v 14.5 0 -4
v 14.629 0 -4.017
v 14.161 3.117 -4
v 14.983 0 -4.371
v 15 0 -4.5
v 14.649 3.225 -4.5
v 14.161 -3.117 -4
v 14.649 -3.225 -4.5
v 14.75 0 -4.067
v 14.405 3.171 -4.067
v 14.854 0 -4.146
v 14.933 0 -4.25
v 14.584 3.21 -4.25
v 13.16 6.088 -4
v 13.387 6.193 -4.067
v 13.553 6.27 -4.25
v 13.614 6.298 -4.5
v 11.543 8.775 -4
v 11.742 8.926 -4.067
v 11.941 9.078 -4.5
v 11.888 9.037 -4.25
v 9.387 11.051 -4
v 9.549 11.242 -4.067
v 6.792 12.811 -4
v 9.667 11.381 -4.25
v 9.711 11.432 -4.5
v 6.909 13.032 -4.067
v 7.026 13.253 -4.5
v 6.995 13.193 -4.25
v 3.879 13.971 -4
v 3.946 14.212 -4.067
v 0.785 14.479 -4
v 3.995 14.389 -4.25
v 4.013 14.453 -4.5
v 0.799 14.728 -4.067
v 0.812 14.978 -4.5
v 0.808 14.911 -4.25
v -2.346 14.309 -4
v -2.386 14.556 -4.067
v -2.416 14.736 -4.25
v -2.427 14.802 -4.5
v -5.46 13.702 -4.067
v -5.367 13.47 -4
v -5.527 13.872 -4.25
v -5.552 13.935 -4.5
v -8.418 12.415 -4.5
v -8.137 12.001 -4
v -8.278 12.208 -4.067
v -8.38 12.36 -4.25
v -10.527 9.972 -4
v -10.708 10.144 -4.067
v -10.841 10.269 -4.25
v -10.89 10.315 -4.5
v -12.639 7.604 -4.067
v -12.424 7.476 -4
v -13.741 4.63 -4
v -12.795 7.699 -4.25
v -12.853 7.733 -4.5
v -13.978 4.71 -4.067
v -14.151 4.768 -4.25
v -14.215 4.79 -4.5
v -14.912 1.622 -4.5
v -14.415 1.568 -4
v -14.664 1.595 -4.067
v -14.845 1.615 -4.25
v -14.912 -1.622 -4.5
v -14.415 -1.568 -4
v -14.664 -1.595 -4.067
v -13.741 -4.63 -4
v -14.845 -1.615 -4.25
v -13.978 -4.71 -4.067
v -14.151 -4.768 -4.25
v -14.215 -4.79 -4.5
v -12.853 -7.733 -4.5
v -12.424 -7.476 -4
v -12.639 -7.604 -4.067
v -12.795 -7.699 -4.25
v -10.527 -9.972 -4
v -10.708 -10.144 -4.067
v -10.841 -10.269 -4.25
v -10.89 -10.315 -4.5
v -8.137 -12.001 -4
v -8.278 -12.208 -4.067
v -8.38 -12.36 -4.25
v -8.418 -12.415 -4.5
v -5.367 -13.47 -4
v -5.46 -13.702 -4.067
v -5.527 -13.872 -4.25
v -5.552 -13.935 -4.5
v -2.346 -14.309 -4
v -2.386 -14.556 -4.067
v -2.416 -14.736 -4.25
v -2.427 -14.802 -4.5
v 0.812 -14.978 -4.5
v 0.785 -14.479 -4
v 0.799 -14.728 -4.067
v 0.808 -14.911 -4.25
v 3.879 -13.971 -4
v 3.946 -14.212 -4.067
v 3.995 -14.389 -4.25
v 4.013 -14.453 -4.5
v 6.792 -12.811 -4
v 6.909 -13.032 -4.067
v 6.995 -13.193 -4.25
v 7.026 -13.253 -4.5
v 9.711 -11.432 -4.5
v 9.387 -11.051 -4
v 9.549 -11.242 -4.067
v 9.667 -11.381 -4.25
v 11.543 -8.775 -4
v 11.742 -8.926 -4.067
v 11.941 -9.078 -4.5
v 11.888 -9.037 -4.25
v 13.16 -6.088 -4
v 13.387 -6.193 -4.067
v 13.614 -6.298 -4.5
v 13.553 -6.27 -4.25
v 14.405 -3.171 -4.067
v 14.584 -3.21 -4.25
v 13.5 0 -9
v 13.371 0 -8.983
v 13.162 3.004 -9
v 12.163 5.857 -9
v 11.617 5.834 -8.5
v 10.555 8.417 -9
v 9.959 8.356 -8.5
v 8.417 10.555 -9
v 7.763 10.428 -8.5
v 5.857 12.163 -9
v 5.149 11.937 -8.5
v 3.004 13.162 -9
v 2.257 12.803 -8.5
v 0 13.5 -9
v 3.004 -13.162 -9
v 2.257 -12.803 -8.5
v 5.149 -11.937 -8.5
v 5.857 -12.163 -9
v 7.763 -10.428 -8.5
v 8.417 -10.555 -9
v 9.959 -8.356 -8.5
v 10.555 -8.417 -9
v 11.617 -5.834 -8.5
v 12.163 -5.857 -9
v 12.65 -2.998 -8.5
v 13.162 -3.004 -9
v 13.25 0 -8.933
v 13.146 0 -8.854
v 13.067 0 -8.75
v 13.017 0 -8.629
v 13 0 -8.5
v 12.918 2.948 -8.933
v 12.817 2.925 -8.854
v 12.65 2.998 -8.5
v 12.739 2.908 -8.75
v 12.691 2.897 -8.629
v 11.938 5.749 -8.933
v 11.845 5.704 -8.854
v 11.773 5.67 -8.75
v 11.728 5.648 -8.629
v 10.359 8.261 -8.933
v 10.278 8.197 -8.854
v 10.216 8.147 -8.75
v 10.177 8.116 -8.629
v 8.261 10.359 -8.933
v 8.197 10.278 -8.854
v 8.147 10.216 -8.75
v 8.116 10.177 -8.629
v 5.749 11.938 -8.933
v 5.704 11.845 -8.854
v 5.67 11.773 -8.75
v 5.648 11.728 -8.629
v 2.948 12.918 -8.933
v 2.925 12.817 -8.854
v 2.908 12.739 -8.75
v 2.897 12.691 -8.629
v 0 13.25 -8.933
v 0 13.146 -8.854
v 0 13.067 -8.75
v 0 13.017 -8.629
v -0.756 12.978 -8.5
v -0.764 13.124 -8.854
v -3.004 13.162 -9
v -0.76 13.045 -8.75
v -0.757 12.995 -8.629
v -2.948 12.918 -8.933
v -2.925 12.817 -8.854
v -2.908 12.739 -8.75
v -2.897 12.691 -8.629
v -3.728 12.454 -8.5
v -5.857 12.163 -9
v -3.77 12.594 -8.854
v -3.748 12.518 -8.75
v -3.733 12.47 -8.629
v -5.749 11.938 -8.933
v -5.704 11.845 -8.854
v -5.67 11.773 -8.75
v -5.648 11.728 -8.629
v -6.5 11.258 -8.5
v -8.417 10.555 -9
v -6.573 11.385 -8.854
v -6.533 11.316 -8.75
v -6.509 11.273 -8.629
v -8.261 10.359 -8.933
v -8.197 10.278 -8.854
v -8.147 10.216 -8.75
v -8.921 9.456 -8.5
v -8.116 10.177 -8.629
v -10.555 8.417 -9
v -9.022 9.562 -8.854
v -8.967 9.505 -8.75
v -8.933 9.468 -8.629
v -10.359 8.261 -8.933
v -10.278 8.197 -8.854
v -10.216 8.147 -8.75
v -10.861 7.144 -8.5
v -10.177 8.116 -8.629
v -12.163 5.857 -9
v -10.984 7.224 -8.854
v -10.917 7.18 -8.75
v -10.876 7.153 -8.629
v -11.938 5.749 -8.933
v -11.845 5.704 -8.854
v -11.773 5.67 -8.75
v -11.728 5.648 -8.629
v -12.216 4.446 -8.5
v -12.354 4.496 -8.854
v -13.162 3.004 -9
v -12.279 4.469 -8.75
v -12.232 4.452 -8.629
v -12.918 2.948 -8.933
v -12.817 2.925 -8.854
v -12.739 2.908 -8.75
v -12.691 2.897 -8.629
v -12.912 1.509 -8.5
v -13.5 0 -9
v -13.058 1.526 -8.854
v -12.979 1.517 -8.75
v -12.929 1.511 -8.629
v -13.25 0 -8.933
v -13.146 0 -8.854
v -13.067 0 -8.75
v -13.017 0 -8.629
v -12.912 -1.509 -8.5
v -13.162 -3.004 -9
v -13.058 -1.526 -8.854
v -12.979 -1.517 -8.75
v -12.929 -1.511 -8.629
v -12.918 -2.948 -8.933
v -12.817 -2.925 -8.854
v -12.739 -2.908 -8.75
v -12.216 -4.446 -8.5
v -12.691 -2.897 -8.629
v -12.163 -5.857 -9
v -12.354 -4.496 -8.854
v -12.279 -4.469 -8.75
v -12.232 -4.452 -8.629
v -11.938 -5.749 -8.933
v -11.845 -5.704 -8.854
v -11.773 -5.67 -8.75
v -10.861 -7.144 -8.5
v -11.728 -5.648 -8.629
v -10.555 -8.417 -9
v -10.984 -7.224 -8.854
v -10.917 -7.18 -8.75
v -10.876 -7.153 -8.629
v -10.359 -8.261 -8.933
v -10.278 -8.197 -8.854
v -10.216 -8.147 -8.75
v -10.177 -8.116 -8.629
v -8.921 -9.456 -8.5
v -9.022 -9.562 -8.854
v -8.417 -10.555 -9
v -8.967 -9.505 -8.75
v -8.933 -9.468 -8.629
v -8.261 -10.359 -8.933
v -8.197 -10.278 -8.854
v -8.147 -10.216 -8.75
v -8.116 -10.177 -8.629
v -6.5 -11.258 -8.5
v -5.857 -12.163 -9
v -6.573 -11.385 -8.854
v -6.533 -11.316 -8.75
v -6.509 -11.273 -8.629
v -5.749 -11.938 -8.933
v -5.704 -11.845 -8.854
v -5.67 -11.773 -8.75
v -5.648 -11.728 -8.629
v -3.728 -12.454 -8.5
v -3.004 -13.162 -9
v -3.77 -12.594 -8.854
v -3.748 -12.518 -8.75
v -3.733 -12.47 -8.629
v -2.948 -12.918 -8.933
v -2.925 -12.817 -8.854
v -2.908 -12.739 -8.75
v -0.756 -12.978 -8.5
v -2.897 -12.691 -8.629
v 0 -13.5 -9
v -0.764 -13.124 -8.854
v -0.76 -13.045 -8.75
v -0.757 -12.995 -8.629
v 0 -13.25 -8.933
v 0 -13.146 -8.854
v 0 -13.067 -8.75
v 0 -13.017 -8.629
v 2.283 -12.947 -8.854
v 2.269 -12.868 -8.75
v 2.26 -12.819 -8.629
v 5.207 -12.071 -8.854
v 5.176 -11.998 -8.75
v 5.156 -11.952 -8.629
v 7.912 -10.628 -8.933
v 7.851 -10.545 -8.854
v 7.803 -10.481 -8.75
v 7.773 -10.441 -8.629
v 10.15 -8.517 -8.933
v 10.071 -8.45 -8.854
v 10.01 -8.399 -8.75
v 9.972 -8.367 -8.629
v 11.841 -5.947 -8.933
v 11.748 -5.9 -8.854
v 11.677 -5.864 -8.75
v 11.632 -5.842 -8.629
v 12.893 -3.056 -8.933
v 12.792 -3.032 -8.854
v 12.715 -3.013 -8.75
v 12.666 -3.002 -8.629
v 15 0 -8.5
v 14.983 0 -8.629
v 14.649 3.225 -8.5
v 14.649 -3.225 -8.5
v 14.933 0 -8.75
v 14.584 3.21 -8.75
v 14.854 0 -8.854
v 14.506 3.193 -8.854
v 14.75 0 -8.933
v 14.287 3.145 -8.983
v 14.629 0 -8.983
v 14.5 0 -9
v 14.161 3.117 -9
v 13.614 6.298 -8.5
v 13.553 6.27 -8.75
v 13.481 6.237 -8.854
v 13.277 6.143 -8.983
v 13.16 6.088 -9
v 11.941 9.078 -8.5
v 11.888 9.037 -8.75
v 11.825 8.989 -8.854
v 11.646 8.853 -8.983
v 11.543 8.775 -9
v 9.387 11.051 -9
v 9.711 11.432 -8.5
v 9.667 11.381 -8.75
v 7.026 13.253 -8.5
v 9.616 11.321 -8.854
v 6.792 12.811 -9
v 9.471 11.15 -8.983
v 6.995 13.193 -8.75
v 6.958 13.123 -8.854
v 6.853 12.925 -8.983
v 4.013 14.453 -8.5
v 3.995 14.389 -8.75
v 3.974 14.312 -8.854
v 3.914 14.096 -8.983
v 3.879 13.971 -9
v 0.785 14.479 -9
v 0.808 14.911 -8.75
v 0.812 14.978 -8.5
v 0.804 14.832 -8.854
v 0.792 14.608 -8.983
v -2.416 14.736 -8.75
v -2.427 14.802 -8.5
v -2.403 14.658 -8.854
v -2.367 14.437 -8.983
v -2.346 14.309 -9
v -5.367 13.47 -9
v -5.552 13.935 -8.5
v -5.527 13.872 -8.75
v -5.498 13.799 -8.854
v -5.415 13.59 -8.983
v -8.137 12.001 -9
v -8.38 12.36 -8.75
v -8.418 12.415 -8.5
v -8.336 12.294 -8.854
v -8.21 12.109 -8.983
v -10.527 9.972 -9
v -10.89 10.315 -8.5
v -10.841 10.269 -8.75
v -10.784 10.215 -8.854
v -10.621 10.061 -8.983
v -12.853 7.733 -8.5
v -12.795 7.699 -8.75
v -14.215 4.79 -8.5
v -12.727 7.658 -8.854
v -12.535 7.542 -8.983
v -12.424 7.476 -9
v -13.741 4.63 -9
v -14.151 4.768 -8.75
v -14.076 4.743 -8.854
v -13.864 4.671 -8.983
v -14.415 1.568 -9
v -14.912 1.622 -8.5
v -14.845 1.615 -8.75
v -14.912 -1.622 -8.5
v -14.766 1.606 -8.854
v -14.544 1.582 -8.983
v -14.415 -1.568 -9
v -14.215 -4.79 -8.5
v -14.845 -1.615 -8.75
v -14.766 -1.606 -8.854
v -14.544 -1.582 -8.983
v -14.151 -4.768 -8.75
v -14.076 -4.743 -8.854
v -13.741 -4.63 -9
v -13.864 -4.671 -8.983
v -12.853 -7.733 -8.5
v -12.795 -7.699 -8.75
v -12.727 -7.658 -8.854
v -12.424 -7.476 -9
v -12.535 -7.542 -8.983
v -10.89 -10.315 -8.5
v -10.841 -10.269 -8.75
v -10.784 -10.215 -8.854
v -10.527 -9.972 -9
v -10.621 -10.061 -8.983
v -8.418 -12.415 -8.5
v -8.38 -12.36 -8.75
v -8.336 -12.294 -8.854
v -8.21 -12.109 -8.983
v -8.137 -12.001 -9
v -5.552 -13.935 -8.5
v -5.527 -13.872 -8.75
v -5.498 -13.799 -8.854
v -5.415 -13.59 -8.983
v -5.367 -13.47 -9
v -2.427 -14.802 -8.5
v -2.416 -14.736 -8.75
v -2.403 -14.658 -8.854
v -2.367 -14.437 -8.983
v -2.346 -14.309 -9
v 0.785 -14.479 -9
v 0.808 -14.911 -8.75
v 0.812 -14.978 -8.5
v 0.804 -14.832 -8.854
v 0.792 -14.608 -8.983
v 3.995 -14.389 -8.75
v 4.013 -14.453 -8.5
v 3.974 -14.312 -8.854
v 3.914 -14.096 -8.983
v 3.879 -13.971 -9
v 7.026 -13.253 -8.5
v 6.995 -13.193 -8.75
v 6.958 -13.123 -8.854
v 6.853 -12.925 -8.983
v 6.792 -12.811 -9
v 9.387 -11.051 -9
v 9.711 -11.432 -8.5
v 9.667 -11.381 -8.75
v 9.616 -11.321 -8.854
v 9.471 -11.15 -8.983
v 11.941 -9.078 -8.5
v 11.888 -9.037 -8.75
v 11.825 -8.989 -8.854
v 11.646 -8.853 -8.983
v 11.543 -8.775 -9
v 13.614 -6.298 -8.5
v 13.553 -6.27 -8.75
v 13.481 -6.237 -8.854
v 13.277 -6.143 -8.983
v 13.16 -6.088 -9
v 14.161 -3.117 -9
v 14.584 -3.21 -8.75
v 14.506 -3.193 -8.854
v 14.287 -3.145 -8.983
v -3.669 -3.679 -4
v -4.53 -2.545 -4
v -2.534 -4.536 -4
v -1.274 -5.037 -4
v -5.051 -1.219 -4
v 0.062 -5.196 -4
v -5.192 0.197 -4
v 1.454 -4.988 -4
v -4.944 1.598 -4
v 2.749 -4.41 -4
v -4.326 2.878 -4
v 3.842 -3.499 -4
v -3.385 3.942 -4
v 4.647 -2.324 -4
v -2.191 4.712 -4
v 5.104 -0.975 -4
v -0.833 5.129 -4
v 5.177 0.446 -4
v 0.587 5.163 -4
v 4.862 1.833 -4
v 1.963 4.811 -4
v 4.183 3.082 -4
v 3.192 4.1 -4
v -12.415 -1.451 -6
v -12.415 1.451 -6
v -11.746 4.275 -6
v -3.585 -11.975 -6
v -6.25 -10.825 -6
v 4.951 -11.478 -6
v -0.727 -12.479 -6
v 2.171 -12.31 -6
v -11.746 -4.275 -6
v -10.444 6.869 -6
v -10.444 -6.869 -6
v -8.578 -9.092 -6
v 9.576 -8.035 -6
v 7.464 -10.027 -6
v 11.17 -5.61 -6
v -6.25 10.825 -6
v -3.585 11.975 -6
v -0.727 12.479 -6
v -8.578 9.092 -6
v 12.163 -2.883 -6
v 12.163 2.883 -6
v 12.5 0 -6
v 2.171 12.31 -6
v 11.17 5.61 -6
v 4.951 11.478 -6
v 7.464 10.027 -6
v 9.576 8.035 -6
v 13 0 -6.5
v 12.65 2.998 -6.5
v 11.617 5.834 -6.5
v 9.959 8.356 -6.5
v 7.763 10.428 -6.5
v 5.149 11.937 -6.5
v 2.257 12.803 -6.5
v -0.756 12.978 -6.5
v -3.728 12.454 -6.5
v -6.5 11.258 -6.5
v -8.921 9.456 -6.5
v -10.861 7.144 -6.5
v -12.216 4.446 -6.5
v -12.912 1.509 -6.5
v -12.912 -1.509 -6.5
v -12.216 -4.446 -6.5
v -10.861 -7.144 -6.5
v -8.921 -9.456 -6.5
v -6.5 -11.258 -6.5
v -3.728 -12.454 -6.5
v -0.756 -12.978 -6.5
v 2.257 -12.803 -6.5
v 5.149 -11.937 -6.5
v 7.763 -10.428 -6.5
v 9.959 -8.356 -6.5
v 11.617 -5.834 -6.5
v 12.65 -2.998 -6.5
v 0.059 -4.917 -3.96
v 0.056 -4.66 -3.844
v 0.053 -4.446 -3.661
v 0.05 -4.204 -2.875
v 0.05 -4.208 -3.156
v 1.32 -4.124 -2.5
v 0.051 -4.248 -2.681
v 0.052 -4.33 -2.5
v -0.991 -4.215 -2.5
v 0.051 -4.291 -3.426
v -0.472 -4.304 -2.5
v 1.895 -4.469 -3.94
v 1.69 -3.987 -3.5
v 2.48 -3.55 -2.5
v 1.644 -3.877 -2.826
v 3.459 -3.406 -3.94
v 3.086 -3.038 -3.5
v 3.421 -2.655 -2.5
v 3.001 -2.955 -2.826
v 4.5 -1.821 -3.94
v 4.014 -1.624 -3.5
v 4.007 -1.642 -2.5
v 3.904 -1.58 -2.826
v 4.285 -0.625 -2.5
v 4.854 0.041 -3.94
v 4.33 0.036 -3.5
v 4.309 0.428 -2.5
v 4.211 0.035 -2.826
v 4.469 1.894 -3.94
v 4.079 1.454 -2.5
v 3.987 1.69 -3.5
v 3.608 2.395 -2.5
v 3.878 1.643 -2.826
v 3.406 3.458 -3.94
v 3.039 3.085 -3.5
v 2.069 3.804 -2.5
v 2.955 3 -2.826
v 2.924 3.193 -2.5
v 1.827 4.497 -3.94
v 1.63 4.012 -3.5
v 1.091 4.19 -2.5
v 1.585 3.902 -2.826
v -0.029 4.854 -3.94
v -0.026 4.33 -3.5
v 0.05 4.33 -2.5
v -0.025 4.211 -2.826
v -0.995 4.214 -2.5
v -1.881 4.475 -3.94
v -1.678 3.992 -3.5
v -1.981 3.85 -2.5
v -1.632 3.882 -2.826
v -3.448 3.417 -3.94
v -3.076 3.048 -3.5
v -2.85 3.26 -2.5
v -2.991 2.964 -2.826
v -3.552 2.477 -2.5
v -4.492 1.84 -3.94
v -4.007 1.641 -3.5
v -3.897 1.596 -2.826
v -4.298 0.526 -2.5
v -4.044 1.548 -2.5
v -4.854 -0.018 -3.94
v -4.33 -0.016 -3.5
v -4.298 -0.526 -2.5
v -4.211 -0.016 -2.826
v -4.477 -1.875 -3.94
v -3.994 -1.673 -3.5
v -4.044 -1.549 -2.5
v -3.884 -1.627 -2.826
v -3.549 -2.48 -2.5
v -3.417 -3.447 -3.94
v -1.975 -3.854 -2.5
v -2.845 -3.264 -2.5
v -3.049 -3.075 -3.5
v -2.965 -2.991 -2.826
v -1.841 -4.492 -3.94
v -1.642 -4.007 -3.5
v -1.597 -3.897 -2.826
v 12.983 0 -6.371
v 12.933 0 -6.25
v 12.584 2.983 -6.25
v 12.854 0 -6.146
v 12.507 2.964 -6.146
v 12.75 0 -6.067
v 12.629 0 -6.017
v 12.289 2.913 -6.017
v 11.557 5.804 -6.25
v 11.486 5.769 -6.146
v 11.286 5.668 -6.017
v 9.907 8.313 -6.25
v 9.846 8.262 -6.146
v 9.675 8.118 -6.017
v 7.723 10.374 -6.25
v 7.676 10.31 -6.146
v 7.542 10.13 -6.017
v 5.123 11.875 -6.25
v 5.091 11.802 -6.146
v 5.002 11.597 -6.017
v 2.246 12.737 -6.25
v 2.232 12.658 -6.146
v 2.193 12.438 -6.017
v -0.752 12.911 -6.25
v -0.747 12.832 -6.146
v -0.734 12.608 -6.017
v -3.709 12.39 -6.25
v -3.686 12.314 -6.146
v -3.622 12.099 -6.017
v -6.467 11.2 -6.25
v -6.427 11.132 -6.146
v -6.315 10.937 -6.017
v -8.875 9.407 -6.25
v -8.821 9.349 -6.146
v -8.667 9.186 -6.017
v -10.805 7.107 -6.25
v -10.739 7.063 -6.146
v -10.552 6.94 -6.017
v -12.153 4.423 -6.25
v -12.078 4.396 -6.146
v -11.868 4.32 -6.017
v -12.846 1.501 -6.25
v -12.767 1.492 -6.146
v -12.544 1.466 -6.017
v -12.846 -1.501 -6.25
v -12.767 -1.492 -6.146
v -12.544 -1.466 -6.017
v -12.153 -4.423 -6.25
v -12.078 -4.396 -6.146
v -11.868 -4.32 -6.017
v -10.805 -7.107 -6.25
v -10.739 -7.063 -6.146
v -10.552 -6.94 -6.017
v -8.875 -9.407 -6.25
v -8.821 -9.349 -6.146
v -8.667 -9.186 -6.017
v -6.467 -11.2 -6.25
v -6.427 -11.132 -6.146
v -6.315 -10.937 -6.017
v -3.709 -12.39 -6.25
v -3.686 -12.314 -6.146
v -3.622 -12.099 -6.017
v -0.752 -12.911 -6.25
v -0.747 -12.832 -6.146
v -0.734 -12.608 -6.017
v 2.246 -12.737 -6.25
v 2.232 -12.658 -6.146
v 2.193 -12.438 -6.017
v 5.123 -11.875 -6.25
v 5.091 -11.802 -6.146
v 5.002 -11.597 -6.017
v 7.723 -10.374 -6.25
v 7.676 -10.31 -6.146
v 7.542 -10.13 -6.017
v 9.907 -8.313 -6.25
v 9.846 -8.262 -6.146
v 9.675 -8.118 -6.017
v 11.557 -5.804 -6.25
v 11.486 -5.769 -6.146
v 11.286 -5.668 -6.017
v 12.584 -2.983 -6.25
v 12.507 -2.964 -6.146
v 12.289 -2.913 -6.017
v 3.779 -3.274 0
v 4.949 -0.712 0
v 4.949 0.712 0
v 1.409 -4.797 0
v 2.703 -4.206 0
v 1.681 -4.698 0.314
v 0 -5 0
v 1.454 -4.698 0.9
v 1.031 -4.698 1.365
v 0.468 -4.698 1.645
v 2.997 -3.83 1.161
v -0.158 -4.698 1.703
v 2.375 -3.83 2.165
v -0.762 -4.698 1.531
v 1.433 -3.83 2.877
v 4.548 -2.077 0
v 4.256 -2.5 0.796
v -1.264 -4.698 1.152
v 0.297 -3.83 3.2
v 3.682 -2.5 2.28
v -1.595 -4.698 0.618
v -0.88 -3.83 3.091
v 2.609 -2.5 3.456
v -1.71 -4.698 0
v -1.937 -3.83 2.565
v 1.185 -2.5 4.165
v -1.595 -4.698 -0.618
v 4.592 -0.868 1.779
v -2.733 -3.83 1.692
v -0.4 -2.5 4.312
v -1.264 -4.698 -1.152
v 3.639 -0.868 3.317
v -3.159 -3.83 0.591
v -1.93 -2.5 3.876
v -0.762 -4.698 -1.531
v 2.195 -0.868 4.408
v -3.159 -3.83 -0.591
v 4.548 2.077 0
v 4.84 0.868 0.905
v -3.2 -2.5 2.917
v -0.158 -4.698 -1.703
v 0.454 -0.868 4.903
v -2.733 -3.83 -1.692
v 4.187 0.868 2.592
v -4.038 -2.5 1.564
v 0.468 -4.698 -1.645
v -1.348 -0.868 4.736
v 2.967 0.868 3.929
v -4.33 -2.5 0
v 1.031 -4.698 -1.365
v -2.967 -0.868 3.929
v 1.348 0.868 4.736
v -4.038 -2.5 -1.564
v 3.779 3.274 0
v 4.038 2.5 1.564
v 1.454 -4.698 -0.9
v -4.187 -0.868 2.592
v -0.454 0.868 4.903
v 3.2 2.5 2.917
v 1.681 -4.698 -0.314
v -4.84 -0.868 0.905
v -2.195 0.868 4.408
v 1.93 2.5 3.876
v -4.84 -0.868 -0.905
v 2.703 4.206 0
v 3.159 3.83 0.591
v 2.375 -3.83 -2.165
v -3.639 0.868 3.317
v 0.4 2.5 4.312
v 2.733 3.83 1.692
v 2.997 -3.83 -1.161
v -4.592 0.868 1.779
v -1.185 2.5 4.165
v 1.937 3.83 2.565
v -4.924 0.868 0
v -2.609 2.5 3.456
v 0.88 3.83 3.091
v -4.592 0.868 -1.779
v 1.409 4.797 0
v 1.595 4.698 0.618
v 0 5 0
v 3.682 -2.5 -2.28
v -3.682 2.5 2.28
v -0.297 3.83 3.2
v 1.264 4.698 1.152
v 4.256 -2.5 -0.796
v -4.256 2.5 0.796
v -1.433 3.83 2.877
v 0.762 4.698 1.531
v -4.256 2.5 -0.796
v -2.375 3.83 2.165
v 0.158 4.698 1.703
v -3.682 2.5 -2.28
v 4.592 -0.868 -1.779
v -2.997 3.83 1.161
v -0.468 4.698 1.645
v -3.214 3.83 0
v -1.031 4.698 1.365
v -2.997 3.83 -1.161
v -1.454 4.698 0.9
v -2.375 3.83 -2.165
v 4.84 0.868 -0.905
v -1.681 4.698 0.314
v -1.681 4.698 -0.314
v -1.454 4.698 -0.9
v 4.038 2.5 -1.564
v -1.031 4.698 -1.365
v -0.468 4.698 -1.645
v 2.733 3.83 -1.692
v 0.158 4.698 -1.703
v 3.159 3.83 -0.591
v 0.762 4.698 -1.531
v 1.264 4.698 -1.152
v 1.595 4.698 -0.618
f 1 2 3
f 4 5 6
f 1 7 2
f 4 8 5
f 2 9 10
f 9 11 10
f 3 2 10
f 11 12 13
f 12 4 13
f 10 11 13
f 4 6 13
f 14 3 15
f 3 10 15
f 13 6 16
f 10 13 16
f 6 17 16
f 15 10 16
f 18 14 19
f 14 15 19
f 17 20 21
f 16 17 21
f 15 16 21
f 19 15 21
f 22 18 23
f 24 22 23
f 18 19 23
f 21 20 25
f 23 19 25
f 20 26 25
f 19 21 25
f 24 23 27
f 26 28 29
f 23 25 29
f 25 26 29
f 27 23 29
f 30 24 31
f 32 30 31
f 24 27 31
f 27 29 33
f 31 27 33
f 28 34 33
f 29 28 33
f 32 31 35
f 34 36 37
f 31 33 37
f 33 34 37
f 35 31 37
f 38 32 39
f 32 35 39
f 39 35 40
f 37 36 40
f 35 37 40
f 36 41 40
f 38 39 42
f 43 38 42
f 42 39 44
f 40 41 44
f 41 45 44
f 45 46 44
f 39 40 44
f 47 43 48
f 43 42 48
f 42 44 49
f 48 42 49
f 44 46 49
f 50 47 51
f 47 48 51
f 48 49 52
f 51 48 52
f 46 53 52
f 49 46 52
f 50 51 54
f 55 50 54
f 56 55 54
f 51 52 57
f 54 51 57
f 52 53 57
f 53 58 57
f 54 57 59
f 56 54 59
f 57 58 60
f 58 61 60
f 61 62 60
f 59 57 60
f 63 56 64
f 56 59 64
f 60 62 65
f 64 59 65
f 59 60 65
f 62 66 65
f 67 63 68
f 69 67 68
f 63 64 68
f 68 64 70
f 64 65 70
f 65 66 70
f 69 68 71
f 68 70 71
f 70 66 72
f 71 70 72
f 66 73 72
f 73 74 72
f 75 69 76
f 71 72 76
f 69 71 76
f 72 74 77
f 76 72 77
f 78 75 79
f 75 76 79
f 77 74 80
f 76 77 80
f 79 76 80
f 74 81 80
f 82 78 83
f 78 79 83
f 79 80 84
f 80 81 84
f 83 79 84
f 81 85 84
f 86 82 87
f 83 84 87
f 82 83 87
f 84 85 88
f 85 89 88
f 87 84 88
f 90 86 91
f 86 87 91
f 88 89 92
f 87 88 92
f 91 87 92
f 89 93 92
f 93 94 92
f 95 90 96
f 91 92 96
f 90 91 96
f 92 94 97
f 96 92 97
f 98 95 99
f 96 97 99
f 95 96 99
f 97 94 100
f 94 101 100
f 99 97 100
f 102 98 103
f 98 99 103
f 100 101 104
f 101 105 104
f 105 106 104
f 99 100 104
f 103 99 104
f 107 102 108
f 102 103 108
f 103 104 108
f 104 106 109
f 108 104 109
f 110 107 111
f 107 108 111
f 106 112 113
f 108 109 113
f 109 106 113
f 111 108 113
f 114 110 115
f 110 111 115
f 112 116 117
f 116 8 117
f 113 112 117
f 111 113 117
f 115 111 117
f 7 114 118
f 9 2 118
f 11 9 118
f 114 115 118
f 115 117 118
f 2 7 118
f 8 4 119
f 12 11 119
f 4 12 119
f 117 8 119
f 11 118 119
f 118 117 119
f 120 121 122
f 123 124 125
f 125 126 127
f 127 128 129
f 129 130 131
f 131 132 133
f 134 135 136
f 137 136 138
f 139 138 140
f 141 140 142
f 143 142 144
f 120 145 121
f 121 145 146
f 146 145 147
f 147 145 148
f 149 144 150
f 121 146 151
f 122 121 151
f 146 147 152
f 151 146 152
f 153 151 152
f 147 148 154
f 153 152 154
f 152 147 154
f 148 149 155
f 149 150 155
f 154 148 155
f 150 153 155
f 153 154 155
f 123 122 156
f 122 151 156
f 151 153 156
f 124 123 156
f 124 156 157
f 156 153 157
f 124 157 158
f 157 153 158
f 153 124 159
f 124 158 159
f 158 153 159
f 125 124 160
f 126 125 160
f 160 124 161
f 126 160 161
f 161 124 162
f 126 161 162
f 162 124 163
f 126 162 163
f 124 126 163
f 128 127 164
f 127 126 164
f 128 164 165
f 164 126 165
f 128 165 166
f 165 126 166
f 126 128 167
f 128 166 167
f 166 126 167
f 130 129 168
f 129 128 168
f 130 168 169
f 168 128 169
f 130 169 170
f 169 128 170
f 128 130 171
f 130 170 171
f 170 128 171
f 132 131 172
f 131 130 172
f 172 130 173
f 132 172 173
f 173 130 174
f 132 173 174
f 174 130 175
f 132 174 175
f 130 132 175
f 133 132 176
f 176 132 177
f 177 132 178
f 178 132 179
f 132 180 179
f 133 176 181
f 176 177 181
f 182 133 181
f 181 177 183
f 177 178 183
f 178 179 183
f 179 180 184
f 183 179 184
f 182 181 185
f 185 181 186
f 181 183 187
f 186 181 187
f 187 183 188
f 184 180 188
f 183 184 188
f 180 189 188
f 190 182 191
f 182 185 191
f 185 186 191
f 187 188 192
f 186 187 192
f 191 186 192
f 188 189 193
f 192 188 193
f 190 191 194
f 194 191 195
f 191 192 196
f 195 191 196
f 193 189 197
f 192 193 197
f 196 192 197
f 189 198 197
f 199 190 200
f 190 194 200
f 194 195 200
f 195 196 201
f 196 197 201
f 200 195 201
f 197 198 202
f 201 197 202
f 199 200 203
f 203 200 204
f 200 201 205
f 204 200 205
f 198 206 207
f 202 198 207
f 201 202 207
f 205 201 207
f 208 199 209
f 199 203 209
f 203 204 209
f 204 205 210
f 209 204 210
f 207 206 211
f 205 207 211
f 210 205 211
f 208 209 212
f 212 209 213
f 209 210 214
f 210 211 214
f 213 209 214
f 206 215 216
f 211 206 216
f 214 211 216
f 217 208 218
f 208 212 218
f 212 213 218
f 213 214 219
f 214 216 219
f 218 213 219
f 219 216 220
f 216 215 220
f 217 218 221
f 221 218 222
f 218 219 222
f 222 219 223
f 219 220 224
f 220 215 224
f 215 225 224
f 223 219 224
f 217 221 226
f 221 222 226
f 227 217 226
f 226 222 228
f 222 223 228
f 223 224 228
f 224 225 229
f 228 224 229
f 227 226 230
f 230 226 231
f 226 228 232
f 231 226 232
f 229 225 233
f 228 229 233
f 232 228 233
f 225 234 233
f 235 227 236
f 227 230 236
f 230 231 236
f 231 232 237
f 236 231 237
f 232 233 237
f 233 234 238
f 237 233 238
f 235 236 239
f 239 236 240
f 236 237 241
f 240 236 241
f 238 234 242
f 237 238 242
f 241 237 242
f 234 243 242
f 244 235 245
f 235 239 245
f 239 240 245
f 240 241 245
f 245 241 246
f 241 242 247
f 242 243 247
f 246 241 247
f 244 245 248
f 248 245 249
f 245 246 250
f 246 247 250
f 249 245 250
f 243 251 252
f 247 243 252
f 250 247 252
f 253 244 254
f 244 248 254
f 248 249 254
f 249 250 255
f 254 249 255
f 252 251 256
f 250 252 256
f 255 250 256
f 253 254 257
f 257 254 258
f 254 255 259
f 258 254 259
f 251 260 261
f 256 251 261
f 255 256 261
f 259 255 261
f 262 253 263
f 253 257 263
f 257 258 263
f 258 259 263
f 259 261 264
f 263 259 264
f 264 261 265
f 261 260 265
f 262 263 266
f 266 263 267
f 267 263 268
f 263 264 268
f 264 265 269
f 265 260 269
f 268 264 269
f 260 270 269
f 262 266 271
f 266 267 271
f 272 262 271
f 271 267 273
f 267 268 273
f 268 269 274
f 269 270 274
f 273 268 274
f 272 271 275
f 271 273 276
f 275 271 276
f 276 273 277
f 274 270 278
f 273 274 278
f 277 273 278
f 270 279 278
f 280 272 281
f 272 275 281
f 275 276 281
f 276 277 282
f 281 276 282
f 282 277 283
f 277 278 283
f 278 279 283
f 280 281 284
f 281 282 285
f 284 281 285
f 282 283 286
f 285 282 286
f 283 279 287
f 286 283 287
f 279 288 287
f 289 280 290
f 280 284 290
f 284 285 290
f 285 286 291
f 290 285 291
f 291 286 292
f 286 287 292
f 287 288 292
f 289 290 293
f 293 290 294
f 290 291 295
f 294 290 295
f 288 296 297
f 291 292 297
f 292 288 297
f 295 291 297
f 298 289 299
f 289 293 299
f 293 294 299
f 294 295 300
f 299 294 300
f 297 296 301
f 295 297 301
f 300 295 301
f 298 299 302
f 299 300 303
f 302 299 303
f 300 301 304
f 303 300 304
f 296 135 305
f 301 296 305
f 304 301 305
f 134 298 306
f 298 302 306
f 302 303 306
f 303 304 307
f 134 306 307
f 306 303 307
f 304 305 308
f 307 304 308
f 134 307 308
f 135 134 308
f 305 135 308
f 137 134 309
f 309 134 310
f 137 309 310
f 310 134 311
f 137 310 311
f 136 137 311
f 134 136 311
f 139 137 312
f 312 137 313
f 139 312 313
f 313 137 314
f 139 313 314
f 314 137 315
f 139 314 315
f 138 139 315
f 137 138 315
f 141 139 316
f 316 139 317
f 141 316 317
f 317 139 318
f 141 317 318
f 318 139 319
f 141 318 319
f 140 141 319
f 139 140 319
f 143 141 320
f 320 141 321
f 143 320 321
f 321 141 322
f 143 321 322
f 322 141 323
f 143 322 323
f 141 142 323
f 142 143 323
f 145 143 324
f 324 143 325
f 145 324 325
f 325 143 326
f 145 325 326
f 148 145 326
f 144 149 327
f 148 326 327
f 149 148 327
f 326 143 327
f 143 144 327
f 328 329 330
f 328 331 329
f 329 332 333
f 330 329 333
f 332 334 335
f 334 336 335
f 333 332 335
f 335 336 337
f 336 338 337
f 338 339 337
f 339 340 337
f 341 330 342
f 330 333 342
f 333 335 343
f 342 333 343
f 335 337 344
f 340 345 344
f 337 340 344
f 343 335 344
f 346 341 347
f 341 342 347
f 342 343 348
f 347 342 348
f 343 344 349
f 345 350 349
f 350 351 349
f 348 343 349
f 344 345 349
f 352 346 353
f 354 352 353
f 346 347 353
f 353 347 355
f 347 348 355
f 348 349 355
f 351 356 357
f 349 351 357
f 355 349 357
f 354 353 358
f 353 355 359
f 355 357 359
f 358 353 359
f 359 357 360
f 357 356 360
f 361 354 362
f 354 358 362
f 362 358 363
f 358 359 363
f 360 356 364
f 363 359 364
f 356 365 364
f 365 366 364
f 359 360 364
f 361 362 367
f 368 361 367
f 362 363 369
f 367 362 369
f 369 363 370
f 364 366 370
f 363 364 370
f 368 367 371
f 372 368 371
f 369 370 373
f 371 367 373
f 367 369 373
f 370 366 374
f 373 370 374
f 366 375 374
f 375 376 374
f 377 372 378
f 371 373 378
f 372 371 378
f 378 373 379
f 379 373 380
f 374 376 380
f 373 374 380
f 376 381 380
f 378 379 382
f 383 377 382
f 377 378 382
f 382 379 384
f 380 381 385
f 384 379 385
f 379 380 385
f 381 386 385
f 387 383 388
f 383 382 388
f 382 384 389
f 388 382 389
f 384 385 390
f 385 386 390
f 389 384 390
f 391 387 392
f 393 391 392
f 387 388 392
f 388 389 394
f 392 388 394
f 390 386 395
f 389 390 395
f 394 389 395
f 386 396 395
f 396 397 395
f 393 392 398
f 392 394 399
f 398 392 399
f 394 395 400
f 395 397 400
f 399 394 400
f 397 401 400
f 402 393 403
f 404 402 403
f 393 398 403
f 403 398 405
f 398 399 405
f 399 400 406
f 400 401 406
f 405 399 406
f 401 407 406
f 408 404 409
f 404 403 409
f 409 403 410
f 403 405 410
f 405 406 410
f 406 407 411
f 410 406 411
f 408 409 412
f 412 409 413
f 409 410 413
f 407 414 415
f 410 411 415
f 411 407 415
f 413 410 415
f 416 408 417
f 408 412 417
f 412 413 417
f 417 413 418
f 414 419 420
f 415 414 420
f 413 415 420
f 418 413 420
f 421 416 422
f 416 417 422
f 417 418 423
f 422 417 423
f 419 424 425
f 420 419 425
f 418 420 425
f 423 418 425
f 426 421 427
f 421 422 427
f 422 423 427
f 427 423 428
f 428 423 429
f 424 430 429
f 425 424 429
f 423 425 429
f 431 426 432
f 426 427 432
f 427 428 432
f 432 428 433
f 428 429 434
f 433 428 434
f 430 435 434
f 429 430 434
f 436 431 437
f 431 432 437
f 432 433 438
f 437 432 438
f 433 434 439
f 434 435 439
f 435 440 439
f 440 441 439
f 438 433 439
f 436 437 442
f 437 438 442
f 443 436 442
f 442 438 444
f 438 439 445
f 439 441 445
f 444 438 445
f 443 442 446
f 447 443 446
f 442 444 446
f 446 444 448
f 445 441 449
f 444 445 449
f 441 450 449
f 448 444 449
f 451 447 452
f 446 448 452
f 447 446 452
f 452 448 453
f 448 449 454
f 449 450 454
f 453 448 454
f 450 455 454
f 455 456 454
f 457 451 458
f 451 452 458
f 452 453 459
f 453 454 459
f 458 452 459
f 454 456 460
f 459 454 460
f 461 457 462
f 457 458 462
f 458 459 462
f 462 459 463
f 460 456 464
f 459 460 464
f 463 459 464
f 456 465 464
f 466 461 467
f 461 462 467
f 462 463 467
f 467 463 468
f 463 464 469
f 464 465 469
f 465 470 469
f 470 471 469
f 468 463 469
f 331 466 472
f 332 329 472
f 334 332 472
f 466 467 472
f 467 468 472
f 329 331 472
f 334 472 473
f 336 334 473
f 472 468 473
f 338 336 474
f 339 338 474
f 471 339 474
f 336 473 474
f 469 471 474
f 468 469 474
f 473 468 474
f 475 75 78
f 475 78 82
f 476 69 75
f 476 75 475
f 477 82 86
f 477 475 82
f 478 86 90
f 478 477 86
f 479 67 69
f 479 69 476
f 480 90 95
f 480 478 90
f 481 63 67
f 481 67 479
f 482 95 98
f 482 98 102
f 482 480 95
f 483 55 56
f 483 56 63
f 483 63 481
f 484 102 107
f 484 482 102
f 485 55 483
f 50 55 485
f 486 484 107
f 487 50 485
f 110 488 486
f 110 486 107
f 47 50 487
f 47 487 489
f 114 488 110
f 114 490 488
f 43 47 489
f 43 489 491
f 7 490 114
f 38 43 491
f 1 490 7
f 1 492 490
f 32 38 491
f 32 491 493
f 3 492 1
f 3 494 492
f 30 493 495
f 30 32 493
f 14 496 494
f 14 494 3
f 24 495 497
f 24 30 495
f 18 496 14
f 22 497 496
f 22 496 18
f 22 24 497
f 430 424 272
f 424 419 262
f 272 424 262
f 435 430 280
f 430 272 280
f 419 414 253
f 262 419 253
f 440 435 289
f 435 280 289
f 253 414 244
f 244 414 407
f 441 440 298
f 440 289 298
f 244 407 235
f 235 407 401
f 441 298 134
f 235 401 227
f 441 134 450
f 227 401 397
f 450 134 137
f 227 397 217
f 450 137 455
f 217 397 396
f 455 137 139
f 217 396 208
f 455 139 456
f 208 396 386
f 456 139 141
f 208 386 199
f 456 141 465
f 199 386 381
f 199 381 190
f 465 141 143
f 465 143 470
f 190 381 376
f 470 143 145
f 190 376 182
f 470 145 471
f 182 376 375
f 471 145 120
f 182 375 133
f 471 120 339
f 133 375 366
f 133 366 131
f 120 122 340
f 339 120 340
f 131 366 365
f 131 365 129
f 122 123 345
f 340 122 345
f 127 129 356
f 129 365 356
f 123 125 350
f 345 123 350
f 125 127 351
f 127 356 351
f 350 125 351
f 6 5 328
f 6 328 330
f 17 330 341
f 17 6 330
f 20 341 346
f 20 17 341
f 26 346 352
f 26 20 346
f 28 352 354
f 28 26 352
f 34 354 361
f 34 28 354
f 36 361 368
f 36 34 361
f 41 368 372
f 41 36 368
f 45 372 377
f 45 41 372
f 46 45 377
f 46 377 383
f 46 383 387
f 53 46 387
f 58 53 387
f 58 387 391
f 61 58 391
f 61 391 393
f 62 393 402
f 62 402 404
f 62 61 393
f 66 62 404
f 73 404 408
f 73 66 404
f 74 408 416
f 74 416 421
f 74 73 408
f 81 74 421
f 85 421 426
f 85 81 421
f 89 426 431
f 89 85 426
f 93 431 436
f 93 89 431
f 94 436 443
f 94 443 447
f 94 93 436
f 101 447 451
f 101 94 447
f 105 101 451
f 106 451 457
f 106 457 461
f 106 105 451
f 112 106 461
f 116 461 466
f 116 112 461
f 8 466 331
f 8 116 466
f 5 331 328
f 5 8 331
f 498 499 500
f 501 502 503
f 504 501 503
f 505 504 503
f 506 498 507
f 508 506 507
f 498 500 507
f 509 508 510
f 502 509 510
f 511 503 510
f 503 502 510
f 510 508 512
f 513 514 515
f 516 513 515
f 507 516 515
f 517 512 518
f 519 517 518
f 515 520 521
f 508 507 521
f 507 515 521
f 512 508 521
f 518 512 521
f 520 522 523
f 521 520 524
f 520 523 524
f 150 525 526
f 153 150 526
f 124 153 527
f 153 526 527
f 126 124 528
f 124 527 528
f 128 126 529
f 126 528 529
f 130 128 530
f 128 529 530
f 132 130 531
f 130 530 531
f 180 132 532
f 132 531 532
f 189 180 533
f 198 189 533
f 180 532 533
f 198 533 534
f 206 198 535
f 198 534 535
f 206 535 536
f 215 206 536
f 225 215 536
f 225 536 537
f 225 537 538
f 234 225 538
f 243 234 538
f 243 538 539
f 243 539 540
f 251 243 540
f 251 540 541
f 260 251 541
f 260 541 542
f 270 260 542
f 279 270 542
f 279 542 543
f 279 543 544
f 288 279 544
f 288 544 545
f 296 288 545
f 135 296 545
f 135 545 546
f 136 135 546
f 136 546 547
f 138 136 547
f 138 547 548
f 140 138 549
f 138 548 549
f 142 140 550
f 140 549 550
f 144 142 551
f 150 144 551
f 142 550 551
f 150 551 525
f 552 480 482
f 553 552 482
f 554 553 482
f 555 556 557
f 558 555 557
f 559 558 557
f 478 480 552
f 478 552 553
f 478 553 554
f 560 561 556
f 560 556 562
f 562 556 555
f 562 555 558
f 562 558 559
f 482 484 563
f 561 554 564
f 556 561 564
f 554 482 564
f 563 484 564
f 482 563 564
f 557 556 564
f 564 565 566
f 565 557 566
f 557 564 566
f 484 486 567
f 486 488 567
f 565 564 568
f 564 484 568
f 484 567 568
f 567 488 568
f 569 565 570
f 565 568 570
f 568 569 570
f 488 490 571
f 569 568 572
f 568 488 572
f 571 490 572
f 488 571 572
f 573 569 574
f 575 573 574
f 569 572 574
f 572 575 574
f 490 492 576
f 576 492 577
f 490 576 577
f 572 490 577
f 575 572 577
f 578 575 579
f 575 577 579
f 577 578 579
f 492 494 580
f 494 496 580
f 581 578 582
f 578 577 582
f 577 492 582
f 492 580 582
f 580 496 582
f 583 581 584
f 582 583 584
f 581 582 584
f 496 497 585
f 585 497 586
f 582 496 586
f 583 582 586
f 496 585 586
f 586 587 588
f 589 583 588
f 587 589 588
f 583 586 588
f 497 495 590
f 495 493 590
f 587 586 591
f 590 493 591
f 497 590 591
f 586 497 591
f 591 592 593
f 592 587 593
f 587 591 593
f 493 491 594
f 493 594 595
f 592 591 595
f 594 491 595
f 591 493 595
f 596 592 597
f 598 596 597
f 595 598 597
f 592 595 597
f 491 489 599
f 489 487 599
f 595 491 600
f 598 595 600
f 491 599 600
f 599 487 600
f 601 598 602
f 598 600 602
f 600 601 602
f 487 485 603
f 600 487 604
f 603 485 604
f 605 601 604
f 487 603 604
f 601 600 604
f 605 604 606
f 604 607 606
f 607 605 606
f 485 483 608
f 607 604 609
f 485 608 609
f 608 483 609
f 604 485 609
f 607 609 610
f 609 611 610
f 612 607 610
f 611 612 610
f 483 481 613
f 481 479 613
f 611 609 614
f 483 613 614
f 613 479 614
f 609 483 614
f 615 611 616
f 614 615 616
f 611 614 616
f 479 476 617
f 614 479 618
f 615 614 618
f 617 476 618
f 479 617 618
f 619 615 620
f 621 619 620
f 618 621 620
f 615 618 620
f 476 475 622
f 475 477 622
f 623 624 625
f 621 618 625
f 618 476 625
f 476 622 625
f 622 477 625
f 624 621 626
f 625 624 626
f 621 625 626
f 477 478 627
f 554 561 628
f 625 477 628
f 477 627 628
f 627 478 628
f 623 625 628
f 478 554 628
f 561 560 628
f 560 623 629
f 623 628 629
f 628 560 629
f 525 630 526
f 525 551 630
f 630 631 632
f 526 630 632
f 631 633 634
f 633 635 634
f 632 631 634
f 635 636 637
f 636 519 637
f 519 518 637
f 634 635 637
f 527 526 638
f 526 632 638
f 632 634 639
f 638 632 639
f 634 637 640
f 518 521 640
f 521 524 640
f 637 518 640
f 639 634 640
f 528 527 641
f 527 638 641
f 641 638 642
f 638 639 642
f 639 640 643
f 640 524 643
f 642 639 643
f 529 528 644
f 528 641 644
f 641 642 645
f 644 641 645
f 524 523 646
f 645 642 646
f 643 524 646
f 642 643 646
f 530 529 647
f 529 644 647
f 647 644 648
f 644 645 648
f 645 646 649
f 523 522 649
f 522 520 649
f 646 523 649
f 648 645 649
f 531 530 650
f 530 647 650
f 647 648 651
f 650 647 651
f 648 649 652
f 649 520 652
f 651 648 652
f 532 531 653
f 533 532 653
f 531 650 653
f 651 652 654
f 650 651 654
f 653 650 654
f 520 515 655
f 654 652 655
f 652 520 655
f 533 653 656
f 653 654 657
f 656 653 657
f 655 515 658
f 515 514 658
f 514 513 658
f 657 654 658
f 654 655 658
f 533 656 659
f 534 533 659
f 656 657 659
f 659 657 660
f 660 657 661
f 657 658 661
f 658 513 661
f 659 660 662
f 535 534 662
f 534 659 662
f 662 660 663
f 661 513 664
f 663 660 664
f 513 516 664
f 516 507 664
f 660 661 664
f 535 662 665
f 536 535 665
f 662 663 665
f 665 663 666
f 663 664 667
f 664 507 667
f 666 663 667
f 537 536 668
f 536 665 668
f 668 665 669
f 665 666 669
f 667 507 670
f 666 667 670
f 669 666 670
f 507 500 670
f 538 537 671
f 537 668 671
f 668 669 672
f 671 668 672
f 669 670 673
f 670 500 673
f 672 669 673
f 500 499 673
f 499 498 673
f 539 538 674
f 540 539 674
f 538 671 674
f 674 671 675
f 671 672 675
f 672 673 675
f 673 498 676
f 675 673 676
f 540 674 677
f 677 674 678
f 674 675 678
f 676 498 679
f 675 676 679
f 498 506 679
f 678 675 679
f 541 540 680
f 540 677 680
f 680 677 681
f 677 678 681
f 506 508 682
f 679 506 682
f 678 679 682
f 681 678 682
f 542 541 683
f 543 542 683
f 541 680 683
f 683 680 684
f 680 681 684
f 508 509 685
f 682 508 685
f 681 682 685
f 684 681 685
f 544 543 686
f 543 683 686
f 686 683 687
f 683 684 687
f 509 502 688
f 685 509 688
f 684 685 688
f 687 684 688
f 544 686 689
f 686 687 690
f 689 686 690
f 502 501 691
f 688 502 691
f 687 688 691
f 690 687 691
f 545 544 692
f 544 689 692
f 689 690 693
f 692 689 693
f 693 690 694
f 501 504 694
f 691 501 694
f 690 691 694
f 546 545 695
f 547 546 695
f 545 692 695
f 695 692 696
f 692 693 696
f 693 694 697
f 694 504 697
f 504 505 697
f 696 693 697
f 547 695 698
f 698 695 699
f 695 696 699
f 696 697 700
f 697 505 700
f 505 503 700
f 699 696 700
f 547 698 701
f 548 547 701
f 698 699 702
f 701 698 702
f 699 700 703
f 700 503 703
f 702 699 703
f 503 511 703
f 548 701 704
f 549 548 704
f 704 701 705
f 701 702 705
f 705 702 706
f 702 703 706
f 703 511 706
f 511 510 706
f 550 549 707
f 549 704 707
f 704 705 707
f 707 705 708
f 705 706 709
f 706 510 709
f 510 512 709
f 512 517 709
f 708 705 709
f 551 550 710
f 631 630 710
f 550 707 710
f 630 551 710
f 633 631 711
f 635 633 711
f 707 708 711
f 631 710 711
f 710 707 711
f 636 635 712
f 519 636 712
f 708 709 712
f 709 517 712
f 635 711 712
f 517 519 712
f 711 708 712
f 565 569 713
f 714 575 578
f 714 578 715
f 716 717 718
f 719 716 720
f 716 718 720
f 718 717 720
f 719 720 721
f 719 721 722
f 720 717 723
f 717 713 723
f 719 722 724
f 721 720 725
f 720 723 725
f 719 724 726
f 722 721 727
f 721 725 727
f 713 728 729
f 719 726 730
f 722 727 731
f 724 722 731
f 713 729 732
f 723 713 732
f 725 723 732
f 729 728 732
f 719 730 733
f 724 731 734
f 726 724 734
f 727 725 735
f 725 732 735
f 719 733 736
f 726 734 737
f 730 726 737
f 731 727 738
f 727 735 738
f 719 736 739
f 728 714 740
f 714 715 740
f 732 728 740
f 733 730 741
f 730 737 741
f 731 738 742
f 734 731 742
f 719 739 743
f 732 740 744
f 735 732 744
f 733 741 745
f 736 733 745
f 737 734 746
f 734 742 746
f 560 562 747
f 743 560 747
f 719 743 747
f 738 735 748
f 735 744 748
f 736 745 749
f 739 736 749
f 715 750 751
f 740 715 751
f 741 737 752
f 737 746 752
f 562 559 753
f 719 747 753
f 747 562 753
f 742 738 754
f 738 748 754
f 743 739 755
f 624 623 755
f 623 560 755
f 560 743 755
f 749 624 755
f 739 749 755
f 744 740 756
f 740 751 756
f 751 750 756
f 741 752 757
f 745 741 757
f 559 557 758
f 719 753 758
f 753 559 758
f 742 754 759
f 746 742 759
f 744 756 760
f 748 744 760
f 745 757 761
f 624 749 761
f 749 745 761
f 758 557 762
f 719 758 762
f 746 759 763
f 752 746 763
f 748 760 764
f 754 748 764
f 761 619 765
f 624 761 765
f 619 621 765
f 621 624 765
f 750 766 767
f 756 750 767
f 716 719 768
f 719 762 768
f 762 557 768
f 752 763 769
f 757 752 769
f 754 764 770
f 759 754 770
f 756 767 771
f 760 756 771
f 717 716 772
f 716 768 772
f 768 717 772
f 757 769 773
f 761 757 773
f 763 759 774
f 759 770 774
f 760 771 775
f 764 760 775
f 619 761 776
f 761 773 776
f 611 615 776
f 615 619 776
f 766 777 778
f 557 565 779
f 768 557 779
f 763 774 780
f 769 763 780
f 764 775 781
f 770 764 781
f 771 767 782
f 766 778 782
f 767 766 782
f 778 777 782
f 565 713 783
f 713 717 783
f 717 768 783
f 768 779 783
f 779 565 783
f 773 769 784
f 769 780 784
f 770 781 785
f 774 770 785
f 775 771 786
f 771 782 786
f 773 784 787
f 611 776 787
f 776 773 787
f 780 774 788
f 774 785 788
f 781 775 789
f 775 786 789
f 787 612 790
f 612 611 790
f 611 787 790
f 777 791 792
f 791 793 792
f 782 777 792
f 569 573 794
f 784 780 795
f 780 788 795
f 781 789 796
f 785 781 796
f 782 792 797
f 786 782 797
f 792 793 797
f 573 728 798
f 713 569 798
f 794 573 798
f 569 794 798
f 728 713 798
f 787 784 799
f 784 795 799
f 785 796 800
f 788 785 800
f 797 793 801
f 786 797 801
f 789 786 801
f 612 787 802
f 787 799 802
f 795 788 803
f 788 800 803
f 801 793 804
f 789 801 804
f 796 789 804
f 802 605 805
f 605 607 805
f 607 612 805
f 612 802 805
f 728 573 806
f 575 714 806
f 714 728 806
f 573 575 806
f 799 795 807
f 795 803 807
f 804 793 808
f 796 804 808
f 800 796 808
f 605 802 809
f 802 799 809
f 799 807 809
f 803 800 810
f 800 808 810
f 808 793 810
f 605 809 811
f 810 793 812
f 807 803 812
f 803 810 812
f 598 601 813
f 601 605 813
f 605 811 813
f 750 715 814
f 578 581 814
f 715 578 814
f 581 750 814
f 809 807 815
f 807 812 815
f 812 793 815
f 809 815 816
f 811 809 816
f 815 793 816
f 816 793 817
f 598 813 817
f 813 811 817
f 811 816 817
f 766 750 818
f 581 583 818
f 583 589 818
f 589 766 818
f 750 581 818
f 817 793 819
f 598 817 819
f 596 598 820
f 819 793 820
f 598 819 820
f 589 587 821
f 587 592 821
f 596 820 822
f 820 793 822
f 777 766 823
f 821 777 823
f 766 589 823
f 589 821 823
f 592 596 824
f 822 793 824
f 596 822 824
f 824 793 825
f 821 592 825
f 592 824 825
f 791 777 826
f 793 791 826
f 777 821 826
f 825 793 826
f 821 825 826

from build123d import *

# Parameters (mm, degrees)
F3_R     = 13
F4_DEPTH = 2
F3_R_2   = 15
F5_DEPTH = 5
F6_R     = 1
F7_R     = 0.5


with BuildPart() as f1:
    # F0 (on Top) → F1 (revolve)
    with BuildSketch(Plane.XY):
        with BuildLine():
            Line((0, 5), (0, -5))
            ThreePointArc((0, -5), (5, 0), (0, 5))
        make_face()
    revolve(axis=Axis((0, 0, 0), (0, -1, 0)))

    # F3 (on offset) → F4 (join)
    with BuildSketch(Plane.XY.offset(-4)):
        Circle(F3_R)
    extrude(amount=-F4_DEPTH)

    # F3 (on offset) → F5 (join)
    with BuildSketch(Plane.XY.offset(-4)):
        Circle(F3_R_2)
        Circle(F3_R, mode=Mode.SUBTRACT)
    extrude(amount=-F5_DEPTH)

    # F6
    f6_edges = [f1.edges().sort_by_distance(p)[0] for p in [
        (0, 3, -4),
    ]]
    fillet(f6_edges, radius=F6_R)

    # F7
    f7_edges = [f1.edges().sort_by_distance(p)[0] for p in [
        (-15, 0, -4),
        (-13, 0, -9),
        (-15, 0, -9),
        (-13, 0, -6),
    ]]
    fillet(f7_edges, radius=F7_R)


solid = f1.part
